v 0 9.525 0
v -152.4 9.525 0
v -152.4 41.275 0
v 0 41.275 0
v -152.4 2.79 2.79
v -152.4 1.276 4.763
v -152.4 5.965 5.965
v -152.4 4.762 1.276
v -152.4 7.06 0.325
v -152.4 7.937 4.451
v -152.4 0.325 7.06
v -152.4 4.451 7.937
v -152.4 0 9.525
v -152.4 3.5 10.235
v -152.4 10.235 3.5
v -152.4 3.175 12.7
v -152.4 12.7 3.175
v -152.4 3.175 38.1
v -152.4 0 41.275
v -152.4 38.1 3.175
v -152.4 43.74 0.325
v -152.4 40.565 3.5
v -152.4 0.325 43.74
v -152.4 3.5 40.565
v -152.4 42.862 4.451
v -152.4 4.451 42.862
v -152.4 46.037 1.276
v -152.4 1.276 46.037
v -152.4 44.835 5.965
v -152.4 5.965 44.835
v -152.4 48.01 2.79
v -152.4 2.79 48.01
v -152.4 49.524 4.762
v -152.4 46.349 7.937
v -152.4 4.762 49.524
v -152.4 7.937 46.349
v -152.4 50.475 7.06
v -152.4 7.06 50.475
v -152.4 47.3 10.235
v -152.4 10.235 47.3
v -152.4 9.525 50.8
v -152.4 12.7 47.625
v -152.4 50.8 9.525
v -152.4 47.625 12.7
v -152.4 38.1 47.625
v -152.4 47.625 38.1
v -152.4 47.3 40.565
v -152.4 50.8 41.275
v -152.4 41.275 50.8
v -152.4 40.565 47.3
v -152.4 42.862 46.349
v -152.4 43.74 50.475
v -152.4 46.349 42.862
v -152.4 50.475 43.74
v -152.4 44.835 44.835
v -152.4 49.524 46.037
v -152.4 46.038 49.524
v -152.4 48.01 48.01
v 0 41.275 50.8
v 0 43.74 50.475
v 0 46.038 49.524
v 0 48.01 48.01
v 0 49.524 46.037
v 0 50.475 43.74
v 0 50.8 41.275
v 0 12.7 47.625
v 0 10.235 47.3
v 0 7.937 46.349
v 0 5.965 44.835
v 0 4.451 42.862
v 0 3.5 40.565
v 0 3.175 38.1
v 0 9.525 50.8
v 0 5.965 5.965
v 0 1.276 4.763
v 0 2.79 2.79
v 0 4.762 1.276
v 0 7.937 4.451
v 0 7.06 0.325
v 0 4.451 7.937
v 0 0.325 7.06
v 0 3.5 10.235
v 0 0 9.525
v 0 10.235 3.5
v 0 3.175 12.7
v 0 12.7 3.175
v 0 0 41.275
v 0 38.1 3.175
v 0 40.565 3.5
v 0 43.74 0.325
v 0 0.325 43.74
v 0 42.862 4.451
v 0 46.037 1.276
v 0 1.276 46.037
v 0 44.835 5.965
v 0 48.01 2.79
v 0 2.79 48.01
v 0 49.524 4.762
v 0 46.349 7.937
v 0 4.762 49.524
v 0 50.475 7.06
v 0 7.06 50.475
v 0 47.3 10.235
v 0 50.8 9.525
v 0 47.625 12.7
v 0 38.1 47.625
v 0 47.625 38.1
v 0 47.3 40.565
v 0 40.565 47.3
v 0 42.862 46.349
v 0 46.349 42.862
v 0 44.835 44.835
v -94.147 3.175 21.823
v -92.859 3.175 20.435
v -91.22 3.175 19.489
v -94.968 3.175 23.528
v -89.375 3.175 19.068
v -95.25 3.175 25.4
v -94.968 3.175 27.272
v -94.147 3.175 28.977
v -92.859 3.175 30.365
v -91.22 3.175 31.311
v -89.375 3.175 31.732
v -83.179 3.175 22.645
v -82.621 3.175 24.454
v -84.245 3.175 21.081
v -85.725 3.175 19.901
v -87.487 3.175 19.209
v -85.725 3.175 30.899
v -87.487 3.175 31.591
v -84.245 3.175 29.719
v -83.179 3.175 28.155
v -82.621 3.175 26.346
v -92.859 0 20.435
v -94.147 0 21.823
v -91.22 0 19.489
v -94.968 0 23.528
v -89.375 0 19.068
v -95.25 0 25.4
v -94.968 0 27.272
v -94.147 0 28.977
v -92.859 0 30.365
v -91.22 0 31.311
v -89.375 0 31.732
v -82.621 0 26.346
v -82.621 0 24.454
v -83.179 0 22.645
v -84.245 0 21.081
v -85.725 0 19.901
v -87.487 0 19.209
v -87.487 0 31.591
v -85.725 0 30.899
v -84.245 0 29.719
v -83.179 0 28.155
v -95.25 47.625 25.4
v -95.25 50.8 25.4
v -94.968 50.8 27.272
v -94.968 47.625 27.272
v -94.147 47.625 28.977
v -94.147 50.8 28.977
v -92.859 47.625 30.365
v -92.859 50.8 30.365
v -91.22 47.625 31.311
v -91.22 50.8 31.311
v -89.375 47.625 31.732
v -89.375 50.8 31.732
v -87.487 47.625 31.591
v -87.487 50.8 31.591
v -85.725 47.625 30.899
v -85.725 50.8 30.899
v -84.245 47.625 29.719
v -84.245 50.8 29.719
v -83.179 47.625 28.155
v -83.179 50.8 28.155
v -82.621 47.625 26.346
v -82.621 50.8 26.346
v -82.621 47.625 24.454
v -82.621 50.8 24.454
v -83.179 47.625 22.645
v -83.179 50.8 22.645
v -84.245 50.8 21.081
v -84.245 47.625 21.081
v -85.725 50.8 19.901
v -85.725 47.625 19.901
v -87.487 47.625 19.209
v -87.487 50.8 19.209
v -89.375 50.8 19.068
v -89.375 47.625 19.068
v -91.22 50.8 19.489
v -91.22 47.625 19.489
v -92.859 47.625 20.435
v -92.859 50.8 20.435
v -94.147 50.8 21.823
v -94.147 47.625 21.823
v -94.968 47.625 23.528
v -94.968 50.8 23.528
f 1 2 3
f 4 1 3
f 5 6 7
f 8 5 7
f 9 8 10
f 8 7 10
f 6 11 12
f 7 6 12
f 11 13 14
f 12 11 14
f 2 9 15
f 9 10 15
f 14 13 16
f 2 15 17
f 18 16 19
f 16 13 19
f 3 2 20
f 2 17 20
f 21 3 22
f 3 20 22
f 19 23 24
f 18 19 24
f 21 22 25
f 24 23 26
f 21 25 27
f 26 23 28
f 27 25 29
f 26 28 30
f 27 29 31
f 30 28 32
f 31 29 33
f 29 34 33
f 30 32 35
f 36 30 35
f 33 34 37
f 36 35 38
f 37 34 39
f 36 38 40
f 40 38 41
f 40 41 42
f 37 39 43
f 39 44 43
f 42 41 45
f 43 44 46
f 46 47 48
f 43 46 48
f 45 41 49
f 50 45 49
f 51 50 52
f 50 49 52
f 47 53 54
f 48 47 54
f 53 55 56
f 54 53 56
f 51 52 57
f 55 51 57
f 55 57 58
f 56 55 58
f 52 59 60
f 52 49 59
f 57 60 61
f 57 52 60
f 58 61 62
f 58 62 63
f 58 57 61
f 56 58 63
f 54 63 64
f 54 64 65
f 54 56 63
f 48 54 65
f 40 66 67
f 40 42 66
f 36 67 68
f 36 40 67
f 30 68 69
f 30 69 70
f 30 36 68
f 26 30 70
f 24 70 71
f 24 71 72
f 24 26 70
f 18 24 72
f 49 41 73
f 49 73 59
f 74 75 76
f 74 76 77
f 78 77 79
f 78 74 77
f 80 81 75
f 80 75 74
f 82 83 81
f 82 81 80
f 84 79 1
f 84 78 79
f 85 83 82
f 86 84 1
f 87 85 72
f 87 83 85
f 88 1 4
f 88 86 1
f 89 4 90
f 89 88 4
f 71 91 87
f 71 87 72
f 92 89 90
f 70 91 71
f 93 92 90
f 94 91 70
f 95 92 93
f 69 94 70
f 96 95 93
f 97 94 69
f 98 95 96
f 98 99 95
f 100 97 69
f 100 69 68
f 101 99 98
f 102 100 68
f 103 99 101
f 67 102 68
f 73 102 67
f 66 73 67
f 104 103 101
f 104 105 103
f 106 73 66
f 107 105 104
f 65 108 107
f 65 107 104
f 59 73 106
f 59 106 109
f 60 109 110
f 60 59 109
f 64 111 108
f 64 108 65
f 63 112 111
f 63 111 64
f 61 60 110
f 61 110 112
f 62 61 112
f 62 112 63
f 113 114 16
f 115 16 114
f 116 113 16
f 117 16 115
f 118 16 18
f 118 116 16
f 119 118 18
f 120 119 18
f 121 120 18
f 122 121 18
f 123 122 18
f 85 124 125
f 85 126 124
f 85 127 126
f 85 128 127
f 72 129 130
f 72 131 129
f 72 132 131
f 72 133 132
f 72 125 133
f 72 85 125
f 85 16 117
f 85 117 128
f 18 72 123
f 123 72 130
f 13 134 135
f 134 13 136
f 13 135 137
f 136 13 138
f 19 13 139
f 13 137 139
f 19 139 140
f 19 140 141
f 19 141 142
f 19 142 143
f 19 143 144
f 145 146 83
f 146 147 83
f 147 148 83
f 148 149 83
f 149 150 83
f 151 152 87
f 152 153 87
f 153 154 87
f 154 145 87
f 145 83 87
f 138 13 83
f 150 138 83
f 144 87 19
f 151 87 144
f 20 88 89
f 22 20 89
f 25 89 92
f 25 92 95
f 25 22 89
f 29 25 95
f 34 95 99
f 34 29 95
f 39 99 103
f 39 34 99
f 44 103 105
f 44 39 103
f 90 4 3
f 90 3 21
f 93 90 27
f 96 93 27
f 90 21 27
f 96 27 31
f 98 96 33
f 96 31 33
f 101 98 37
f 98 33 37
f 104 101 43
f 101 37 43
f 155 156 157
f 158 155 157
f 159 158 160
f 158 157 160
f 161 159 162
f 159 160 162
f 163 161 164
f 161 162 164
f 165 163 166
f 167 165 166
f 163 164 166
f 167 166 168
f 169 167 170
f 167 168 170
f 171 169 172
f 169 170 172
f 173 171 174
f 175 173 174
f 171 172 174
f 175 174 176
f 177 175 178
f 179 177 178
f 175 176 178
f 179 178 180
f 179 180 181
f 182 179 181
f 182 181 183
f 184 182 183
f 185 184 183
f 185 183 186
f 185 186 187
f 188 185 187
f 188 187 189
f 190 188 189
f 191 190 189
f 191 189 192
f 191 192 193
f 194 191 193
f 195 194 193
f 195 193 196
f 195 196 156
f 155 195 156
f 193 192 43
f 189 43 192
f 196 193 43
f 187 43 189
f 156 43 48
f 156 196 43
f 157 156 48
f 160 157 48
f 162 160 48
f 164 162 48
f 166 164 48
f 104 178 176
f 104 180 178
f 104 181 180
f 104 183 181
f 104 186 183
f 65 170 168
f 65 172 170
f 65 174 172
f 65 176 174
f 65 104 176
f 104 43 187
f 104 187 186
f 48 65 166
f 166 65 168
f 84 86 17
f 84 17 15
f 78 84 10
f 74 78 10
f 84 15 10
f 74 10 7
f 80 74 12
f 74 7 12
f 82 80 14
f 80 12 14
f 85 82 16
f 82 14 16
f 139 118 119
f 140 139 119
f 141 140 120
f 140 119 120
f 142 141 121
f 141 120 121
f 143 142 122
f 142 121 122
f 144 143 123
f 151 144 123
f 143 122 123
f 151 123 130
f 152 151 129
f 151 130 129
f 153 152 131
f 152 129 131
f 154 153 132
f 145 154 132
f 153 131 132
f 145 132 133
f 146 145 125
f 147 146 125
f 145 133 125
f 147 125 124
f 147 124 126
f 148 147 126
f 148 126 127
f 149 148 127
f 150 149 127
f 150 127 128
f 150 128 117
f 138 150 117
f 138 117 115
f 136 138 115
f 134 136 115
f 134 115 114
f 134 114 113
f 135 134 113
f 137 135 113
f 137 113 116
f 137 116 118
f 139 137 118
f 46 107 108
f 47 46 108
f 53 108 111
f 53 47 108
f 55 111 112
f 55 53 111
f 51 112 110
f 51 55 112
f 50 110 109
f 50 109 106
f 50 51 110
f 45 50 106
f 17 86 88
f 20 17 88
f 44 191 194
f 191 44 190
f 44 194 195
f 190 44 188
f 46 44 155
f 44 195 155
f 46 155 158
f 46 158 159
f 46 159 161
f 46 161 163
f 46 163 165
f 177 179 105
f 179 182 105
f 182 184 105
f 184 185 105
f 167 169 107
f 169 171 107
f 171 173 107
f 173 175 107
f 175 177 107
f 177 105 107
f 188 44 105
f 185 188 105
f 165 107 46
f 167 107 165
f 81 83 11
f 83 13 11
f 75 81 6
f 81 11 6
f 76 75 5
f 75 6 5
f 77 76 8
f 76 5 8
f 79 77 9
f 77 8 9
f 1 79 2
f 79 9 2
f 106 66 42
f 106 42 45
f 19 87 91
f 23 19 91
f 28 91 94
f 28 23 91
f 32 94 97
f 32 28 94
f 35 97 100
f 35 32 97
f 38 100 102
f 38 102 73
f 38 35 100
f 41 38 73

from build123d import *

# Parameters (mm, degrees)
F0_W     = 50.8
F0_H     = 50.8
F1_DEPTH = 152.4
F2_W     = 44.45
F2_H     = 44.45
F3_DEPTH = 876.3
F4_R     = 9.525
F6_D     = 12.7
F6_DEPTH = 127


with BuildPart() as f1:
    # F0 (on Right) → F1 (new body)
    with BuildSketch(Plane.YZ):
        with Locations((25.4, 25.4)):
            Rectangle(F0_W, F0_H)
    extrude(amount=-F1_DEPTH)

    # F2 (on face) → F3 (cut)
    with BuildSketch(Plane.YZ):
        with Locations((25.4, 25.4)):
            Rectangle(F2_W, F2_H)
    extrude(amount=-F3_DEPTH, mode=Mode.SUBTRACT)

    # F4
    f4_edges = [f1.edges().sort_by_distance(p)[0] for p in [
        (-76.2, 3.175, 3.175),
        (-76.2, 47.625, 3.175),
        (-76.2, 47.625, 47.625),
        (-76.2, 3.175, 47.625),
        (-76.2, 50.8, 0),
        (-76.2, 50.8, 50.8),
        (-76.2, 0, 50.8),
        (-76.2, 0, 0),
    ]]
    fillet(f4_edges, radius=F4_R)

    # F6
    with Locations(Plane.XZ):
        with Locations((-88.9, 25.4)):
            Hole(F6_D / 2, depth=F6_DEPTH)


solid = f1.part
